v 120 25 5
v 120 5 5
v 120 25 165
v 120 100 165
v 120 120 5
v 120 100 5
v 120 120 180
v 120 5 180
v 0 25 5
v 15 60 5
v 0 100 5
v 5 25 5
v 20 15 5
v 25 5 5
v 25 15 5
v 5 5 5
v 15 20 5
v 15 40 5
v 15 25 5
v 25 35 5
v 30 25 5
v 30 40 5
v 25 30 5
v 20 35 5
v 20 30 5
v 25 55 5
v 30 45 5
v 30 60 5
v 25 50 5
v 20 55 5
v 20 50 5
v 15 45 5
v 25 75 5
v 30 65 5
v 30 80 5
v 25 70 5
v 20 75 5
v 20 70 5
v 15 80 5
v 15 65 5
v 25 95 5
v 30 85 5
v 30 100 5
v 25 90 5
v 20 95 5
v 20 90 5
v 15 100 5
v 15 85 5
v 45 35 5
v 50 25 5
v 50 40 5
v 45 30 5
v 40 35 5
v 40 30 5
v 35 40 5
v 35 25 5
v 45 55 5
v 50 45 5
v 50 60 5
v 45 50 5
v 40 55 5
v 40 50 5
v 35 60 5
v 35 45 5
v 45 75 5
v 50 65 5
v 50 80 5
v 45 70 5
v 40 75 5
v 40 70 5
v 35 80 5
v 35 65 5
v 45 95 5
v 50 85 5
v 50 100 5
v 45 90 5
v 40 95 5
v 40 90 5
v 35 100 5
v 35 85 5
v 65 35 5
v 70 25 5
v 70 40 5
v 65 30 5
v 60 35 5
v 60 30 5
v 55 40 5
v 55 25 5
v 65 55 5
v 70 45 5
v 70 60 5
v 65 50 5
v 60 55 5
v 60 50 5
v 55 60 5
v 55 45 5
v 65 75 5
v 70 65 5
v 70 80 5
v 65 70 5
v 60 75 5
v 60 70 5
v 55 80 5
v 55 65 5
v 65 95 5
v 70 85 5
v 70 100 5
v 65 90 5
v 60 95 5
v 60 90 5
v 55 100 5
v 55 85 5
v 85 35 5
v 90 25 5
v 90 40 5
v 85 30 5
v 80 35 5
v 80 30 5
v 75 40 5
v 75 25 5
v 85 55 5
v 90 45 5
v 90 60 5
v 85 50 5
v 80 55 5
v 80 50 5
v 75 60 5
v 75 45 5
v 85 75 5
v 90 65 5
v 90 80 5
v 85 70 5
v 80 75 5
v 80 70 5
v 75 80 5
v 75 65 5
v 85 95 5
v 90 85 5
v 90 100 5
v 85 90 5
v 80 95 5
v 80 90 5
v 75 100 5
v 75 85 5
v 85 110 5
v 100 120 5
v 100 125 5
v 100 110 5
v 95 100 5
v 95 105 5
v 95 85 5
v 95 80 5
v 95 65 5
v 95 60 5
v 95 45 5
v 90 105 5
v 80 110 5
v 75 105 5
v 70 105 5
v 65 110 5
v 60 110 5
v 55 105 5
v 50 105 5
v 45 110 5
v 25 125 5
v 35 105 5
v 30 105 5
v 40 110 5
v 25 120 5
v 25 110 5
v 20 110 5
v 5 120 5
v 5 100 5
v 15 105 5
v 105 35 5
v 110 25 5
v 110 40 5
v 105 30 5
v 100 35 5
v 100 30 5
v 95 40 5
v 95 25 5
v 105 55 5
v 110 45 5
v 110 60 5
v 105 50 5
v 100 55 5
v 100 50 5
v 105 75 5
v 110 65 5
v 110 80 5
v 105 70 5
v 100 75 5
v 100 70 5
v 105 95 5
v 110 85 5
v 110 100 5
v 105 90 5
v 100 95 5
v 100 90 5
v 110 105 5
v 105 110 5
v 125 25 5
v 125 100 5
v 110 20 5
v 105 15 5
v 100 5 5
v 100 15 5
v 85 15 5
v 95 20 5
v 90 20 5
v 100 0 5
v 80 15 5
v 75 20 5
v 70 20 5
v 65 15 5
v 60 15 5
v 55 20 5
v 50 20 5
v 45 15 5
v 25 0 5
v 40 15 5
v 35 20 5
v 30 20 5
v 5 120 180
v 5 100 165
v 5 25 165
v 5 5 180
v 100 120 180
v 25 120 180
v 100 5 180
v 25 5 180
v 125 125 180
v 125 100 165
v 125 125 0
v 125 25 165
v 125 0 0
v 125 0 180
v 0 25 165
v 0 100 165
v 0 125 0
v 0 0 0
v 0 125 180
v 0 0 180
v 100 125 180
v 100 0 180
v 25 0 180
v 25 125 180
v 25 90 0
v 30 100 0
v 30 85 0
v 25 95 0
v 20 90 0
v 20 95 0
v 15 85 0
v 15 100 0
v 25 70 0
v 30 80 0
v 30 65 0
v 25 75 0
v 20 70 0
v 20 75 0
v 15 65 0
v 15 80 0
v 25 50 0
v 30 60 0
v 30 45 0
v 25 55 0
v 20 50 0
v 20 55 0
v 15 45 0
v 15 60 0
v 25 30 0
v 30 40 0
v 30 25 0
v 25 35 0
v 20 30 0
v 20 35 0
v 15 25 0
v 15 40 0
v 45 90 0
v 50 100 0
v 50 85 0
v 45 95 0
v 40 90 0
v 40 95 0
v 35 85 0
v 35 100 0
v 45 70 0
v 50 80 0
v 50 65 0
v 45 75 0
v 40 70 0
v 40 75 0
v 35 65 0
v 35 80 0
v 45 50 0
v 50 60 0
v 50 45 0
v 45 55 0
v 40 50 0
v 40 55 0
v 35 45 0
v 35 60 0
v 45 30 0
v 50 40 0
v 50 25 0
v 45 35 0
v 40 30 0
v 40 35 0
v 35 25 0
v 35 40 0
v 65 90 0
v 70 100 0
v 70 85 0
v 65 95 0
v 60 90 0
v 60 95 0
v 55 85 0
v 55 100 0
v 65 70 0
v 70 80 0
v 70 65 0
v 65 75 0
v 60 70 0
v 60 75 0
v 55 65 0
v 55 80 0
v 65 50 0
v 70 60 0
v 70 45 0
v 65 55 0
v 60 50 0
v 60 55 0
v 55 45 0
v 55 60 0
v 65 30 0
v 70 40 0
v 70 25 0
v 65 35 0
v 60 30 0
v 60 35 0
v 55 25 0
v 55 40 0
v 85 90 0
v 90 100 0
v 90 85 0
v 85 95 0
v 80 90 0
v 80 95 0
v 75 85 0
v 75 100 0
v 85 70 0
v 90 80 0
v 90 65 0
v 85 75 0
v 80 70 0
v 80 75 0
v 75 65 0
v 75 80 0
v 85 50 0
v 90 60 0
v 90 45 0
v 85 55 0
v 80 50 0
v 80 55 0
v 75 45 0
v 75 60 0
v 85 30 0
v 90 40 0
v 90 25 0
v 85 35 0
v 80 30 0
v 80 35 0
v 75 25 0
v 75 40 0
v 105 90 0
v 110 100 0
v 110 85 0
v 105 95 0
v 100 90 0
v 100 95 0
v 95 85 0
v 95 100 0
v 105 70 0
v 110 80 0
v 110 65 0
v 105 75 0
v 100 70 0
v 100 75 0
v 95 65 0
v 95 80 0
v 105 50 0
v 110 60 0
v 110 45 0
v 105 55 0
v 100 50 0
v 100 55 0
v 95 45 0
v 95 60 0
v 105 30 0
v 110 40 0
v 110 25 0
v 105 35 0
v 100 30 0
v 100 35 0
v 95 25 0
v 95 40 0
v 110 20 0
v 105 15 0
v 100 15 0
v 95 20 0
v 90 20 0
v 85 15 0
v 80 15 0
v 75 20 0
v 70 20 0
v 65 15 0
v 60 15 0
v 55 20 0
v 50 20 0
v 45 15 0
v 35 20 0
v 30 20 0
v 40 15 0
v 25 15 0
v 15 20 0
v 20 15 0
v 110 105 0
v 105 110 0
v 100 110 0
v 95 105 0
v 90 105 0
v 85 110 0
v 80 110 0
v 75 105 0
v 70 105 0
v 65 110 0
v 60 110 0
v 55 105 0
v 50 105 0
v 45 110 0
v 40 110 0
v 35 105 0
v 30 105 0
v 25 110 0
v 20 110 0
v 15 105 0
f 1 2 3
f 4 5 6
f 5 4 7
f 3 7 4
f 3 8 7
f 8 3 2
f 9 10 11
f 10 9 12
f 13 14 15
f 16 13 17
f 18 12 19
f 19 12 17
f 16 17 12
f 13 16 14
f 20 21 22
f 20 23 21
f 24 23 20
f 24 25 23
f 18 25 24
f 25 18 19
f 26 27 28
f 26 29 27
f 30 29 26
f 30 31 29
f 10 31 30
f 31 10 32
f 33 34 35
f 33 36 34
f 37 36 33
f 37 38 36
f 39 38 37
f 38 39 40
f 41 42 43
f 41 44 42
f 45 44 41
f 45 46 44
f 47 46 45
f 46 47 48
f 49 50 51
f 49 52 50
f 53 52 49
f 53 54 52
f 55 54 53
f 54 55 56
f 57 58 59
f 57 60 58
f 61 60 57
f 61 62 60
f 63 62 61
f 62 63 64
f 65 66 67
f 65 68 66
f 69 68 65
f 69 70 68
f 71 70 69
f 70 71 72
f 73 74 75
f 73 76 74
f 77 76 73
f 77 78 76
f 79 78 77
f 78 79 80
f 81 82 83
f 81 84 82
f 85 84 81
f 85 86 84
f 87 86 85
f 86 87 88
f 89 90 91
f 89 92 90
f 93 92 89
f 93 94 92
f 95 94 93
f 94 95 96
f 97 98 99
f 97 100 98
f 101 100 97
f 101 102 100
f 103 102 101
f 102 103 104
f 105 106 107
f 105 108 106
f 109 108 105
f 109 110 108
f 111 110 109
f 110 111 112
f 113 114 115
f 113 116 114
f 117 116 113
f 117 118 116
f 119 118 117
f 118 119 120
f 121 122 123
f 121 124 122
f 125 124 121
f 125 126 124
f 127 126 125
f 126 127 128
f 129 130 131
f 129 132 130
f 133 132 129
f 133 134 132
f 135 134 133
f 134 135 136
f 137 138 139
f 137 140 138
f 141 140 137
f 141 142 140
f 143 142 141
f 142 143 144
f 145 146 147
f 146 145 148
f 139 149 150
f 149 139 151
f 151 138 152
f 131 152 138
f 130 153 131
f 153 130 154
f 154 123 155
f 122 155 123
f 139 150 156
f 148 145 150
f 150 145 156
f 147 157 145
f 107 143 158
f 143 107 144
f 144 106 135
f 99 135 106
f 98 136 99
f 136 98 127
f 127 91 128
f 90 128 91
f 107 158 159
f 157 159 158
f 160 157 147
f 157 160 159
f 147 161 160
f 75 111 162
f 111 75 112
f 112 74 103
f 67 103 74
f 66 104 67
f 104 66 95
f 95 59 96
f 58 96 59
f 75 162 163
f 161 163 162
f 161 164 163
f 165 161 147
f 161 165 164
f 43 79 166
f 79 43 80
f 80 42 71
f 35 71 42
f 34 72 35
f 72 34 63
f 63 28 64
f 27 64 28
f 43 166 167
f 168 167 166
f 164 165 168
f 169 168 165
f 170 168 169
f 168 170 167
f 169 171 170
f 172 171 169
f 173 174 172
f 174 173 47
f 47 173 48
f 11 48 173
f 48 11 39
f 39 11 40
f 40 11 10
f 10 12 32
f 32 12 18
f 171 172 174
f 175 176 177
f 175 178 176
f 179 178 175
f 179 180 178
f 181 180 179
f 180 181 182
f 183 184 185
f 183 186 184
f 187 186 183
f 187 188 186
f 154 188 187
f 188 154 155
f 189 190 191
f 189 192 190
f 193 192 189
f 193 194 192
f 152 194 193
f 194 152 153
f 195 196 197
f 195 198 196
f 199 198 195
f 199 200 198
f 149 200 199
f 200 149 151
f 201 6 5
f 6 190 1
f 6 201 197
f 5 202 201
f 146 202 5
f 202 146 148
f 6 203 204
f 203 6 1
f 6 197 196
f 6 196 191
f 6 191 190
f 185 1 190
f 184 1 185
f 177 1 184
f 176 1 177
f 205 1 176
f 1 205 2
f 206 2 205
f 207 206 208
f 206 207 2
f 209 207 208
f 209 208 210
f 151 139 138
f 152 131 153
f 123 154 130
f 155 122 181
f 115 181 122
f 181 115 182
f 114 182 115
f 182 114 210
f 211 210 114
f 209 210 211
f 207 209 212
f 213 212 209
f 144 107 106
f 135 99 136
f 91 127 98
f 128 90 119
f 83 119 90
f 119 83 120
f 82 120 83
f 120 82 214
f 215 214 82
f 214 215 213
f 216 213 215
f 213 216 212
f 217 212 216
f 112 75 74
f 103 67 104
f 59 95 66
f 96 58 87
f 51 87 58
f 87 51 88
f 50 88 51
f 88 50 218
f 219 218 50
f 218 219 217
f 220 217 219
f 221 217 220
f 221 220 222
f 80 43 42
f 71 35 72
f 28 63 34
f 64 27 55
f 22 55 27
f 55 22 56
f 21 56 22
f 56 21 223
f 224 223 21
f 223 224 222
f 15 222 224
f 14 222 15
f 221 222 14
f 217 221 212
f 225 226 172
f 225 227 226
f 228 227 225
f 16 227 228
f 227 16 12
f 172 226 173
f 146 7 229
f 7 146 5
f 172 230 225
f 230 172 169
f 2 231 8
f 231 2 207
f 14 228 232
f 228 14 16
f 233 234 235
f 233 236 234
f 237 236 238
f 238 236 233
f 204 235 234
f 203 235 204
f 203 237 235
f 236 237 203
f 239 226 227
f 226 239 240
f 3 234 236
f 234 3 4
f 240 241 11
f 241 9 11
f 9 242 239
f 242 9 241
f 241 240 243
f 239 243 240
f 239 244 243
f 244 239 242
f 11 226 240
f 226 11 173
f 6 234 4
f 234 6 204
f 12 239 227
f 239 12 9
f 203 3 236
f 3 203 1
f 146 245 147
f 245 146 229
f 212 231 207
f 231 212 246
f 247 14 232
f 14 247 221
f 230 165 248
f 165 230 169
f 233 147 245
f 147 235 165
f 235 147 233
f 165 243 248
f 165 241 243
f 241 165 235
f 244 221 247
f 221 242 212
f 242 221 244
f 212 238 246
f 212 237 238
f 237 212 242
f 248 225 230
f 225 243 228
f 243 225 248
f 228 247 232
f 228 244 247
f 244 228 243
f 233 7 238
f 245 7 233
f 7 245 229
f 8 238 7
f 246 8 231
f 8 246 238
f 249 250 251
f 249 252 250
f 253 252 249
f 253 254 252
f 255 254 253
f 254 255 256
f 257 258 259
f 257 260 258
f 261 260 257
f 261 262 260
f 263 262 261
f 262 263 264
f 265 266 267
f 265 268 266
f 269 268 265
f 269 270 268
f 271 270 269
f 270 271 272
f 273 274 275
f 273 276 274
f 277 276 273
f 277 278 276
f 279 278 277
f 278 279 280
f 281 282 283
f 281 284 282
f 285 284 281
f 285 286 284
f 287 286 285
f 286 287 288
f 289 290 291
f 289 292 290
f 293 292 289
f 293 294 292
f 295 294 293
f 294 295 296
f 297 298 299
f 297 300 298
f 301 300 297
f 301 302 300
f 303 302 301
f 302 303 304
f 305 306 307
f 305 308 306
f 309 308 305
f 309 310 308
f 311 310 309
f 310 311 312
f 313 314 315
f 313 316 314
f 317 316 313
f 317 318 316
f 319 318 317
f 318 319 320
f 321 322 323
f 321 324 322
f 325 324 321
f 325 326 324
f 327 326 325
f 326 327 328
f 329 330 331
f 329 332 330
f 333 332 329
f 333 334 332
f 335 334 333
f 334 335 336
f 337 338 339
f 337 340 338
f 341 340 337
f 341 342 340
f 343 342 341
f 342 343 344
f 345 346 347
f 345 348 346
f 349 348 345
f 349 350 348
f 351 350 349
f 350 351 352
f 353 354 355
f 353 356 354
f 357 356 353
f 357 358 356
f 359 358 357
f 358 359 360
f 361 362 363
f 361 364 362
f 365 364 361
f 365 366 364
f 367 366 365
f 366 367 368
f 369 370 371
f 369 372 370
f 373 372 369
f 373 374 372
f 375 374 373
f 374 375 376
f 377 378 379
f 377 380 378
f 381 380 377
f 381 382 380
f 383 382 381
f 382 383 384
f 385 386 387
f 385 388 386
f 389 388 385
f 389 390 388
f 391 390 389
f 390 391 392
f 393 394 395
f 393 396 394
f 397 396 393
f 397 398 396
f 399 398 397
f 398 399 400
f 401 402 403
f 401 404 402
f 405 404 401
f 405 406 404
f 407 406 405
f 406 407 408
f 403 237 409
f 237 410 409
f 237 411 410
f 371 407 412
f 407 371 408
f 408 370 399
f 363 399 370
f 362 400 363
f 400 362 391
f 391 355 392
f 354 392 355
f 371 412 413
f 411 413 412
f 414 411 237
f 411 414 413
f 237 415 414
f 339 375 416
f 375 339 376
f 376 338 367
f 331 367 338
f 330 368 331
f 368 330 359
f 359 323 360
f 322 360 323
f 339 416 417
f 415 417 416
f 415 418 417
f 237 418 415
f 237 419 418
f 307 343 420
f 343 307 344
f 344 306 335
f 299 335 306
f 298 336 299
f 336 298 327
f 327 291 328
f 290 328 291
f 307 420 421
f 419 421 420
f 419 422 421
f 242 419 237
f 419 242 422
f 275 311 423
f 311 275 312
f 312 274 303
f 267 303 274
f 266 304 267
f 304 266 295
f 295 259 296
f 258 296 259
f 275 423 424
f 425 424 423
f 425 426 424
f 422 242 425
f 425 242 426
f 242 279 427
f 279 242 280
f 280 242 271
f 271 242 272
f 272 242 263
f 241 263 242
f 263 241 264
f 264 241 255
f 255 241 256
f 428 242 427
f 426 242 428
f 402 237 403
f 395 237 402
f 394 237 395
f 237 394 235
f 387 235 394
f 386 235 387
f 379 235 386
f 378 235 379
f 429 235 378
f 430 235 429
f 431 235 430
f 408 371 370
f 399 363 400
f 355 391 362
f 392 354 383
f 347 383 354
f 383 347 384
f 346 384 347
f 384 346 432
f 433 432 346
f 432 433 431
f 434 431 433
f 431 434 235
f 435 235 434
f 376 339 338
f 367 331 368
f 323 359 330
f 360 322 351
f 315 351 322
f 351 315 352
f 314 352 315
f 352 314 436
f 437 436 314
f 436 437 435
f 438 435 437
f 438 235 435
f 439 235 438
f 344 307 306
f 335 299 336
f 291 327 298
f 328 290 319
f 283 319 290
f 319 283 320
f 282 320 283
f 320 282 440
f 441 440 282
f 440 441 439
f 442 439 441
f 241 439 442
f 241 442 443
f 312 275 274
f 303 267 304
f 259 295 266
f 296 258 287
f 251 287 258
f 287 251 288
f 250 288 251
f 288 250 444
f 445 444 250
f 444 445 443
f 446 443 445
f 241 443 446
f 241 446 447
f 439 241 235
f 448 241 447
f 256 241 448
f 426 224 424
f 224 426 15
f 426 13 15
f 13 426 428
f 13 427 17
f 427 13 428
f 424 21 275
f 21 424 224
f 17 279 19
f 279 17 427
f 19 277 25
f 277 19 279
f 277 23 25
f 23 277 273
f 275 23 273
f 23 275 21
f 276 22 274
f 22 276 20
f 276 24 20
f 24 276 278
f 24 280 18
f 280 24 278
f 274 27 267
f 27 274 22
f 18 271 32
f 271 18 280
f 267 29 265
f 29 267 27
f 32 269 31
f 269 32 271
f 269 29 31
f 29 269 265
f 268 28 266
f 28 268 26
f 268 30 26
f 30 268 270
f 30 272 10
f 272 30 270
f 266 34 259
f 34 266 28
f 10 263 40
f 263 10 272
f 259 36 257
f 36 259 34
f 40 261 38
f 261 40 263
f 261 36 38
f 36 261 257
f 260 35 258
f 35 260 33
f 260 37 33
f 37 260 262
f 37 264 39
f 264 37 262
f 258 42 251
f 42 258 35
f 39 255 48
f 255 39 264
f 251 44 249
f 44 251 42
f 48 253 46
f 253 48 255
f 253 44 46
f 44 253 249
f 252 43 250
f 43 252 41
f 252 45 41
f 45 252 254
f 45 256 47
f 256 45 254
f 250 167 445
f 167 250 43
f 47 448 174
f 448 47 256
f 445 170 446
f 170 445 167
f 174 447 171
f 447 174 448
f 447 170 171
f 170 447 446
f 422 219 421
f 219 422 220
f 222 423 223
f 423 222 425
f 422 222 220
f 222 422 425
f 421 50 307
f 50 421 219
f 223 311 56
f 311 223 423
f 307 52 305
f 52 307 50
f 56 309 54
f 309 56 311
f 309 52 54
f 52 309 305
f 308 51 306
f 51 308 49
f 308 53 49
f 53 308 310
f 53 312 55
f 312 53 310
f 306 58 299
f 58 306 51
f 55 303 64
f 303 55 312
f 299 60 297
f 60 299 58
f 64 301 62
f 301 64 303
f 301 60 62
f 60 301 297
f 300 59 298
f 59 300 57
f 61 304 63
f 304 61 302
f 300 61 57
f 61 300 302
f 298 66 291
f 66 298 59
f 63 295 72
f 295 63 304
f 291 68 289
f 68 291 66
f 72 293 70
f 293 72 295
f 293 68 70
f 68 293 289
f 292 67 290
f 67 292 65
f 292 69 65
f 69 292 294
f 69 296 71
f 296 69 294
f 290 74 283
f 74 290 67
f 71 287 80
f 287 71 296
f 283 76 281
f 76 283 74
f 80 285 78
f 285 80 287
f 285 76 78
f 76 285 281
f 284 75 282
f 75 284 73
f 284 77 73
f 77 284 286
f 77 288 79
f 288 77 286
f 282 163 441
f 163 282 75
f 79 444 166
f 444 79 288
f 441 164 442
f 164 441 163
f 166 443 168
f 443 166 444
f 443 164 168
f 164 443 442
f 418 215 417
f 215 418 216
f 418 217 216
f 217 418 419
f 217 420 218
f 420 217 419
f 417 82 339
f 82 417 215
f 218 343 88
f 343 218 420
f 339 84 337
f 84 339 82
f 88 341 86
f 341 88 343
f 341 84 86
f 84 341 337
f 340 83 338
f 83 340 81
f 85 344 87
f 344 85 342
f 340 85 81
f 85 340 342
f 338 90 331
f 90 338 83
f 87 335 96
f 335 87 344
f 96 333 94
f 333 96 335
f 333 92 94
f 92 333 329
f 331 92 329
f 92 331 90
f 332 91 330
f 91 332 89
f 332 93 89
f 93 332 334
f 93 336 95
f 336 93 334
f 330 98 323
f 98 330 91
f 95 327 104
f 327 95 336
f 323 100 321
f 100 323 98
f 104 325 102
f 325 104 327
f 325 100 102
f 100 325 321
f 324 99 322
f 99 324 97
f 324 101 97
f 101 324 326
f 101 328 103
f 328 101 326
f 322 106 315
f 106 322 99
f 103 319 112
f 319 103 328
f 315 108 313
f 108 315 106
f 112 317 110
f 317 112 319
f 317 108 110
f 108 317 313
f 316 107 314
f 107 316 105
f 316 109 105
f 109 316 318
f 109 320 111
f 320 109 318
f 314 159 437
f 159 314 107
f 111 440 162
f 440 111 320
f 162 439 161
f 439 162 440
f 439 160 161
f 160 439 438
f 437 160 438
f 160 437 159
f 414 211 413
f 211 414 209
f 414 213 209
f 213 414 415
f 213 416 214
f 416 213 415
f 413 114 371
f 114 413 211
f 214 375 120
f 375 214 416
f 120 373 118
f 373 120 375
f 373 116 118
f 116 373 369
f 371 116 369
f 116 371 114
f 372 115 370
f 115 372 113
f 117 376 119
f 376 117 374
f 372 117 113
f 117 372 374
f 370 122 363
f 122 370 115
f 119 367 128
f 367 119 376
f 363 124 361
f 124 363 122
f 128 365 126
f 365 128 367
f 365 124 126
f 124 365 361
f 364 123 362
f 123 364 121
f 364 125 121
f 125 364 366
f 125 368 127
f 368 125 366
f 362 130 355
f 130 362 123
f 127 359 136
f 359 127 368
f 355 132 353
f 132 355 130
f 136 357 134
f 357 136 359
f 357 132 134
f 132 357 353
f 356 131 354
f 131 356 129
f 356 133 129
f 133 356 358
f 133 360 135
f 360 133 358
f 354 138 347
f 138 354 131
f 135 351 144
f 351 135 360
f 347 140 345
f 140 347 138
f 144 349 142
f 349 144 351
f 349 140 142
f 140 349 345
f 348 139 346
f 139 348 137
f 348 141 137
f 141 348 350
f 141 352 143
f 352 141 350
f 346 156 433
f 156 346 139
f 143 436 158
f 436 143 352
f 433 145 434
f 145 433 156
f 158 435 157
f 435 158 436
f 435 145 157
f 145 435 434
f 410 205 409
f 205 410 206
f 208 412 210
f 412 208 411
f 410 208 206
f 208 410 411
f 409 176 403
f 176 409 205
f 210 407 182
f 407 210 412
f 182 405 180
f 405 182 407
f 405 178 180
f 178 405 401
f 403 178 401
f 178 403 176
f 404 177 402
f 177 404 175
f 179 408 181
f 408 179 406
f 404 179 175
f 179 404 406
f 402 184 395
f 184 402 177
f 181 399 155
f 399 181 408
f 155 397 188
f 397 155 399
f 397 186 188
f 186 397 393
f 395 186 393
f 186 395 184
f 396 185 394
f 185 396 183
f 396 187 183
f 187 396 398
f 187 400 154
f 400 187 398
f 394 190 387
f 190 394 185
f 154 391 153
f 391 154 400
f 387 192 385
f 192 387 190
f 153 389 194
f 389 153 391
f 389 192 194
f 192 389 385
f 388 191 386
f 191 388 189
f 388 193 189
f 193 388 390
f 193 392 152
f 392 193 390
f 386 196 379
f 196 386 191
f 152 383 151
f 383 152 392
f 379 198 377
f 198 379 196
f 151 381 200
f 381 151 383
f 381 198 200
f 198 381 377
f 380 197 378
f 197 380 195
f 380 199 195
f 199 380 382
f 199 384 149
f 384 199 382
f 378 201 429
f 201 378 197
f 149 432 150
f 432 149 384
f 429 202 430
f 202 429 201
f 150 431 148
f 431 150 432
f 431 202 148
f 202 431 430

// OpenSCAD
z = 180;
difference (){
    difference () {
    cube([125,125,z]);
        for ( x = [5])
            for ( y = [5]) {
                translate([x,y,5])
                    cube([115,115,z+10]);
                translate([0,y+20,5])
                    cube([125,75,z-20]);
                translate([x+20,0,5])
                    cube([75,125,z]);
            }
    }
    for ( x1 = [15,35,55,75,95])
        for ( y1 = [10,30,50,70,90]) {
            translate([x1,y1,0])
            linear_extrude(height = 5)
            polygon([[5,5],[10,5],[15,10],[10,10],[0,10]]);
            translate([x1,y1+5,0])
            linear_extrude(height = 5)
            polygon([[0,5],[15,5],[15,10],[5,10],[0,10]]);
            translate([x1,y1+5,0])
            linear_extrude(height = 5)
            polygon([[0,10],[5,15],[10,15],[15,10]]);
        }
}
//113 largura
//265 comprimento
